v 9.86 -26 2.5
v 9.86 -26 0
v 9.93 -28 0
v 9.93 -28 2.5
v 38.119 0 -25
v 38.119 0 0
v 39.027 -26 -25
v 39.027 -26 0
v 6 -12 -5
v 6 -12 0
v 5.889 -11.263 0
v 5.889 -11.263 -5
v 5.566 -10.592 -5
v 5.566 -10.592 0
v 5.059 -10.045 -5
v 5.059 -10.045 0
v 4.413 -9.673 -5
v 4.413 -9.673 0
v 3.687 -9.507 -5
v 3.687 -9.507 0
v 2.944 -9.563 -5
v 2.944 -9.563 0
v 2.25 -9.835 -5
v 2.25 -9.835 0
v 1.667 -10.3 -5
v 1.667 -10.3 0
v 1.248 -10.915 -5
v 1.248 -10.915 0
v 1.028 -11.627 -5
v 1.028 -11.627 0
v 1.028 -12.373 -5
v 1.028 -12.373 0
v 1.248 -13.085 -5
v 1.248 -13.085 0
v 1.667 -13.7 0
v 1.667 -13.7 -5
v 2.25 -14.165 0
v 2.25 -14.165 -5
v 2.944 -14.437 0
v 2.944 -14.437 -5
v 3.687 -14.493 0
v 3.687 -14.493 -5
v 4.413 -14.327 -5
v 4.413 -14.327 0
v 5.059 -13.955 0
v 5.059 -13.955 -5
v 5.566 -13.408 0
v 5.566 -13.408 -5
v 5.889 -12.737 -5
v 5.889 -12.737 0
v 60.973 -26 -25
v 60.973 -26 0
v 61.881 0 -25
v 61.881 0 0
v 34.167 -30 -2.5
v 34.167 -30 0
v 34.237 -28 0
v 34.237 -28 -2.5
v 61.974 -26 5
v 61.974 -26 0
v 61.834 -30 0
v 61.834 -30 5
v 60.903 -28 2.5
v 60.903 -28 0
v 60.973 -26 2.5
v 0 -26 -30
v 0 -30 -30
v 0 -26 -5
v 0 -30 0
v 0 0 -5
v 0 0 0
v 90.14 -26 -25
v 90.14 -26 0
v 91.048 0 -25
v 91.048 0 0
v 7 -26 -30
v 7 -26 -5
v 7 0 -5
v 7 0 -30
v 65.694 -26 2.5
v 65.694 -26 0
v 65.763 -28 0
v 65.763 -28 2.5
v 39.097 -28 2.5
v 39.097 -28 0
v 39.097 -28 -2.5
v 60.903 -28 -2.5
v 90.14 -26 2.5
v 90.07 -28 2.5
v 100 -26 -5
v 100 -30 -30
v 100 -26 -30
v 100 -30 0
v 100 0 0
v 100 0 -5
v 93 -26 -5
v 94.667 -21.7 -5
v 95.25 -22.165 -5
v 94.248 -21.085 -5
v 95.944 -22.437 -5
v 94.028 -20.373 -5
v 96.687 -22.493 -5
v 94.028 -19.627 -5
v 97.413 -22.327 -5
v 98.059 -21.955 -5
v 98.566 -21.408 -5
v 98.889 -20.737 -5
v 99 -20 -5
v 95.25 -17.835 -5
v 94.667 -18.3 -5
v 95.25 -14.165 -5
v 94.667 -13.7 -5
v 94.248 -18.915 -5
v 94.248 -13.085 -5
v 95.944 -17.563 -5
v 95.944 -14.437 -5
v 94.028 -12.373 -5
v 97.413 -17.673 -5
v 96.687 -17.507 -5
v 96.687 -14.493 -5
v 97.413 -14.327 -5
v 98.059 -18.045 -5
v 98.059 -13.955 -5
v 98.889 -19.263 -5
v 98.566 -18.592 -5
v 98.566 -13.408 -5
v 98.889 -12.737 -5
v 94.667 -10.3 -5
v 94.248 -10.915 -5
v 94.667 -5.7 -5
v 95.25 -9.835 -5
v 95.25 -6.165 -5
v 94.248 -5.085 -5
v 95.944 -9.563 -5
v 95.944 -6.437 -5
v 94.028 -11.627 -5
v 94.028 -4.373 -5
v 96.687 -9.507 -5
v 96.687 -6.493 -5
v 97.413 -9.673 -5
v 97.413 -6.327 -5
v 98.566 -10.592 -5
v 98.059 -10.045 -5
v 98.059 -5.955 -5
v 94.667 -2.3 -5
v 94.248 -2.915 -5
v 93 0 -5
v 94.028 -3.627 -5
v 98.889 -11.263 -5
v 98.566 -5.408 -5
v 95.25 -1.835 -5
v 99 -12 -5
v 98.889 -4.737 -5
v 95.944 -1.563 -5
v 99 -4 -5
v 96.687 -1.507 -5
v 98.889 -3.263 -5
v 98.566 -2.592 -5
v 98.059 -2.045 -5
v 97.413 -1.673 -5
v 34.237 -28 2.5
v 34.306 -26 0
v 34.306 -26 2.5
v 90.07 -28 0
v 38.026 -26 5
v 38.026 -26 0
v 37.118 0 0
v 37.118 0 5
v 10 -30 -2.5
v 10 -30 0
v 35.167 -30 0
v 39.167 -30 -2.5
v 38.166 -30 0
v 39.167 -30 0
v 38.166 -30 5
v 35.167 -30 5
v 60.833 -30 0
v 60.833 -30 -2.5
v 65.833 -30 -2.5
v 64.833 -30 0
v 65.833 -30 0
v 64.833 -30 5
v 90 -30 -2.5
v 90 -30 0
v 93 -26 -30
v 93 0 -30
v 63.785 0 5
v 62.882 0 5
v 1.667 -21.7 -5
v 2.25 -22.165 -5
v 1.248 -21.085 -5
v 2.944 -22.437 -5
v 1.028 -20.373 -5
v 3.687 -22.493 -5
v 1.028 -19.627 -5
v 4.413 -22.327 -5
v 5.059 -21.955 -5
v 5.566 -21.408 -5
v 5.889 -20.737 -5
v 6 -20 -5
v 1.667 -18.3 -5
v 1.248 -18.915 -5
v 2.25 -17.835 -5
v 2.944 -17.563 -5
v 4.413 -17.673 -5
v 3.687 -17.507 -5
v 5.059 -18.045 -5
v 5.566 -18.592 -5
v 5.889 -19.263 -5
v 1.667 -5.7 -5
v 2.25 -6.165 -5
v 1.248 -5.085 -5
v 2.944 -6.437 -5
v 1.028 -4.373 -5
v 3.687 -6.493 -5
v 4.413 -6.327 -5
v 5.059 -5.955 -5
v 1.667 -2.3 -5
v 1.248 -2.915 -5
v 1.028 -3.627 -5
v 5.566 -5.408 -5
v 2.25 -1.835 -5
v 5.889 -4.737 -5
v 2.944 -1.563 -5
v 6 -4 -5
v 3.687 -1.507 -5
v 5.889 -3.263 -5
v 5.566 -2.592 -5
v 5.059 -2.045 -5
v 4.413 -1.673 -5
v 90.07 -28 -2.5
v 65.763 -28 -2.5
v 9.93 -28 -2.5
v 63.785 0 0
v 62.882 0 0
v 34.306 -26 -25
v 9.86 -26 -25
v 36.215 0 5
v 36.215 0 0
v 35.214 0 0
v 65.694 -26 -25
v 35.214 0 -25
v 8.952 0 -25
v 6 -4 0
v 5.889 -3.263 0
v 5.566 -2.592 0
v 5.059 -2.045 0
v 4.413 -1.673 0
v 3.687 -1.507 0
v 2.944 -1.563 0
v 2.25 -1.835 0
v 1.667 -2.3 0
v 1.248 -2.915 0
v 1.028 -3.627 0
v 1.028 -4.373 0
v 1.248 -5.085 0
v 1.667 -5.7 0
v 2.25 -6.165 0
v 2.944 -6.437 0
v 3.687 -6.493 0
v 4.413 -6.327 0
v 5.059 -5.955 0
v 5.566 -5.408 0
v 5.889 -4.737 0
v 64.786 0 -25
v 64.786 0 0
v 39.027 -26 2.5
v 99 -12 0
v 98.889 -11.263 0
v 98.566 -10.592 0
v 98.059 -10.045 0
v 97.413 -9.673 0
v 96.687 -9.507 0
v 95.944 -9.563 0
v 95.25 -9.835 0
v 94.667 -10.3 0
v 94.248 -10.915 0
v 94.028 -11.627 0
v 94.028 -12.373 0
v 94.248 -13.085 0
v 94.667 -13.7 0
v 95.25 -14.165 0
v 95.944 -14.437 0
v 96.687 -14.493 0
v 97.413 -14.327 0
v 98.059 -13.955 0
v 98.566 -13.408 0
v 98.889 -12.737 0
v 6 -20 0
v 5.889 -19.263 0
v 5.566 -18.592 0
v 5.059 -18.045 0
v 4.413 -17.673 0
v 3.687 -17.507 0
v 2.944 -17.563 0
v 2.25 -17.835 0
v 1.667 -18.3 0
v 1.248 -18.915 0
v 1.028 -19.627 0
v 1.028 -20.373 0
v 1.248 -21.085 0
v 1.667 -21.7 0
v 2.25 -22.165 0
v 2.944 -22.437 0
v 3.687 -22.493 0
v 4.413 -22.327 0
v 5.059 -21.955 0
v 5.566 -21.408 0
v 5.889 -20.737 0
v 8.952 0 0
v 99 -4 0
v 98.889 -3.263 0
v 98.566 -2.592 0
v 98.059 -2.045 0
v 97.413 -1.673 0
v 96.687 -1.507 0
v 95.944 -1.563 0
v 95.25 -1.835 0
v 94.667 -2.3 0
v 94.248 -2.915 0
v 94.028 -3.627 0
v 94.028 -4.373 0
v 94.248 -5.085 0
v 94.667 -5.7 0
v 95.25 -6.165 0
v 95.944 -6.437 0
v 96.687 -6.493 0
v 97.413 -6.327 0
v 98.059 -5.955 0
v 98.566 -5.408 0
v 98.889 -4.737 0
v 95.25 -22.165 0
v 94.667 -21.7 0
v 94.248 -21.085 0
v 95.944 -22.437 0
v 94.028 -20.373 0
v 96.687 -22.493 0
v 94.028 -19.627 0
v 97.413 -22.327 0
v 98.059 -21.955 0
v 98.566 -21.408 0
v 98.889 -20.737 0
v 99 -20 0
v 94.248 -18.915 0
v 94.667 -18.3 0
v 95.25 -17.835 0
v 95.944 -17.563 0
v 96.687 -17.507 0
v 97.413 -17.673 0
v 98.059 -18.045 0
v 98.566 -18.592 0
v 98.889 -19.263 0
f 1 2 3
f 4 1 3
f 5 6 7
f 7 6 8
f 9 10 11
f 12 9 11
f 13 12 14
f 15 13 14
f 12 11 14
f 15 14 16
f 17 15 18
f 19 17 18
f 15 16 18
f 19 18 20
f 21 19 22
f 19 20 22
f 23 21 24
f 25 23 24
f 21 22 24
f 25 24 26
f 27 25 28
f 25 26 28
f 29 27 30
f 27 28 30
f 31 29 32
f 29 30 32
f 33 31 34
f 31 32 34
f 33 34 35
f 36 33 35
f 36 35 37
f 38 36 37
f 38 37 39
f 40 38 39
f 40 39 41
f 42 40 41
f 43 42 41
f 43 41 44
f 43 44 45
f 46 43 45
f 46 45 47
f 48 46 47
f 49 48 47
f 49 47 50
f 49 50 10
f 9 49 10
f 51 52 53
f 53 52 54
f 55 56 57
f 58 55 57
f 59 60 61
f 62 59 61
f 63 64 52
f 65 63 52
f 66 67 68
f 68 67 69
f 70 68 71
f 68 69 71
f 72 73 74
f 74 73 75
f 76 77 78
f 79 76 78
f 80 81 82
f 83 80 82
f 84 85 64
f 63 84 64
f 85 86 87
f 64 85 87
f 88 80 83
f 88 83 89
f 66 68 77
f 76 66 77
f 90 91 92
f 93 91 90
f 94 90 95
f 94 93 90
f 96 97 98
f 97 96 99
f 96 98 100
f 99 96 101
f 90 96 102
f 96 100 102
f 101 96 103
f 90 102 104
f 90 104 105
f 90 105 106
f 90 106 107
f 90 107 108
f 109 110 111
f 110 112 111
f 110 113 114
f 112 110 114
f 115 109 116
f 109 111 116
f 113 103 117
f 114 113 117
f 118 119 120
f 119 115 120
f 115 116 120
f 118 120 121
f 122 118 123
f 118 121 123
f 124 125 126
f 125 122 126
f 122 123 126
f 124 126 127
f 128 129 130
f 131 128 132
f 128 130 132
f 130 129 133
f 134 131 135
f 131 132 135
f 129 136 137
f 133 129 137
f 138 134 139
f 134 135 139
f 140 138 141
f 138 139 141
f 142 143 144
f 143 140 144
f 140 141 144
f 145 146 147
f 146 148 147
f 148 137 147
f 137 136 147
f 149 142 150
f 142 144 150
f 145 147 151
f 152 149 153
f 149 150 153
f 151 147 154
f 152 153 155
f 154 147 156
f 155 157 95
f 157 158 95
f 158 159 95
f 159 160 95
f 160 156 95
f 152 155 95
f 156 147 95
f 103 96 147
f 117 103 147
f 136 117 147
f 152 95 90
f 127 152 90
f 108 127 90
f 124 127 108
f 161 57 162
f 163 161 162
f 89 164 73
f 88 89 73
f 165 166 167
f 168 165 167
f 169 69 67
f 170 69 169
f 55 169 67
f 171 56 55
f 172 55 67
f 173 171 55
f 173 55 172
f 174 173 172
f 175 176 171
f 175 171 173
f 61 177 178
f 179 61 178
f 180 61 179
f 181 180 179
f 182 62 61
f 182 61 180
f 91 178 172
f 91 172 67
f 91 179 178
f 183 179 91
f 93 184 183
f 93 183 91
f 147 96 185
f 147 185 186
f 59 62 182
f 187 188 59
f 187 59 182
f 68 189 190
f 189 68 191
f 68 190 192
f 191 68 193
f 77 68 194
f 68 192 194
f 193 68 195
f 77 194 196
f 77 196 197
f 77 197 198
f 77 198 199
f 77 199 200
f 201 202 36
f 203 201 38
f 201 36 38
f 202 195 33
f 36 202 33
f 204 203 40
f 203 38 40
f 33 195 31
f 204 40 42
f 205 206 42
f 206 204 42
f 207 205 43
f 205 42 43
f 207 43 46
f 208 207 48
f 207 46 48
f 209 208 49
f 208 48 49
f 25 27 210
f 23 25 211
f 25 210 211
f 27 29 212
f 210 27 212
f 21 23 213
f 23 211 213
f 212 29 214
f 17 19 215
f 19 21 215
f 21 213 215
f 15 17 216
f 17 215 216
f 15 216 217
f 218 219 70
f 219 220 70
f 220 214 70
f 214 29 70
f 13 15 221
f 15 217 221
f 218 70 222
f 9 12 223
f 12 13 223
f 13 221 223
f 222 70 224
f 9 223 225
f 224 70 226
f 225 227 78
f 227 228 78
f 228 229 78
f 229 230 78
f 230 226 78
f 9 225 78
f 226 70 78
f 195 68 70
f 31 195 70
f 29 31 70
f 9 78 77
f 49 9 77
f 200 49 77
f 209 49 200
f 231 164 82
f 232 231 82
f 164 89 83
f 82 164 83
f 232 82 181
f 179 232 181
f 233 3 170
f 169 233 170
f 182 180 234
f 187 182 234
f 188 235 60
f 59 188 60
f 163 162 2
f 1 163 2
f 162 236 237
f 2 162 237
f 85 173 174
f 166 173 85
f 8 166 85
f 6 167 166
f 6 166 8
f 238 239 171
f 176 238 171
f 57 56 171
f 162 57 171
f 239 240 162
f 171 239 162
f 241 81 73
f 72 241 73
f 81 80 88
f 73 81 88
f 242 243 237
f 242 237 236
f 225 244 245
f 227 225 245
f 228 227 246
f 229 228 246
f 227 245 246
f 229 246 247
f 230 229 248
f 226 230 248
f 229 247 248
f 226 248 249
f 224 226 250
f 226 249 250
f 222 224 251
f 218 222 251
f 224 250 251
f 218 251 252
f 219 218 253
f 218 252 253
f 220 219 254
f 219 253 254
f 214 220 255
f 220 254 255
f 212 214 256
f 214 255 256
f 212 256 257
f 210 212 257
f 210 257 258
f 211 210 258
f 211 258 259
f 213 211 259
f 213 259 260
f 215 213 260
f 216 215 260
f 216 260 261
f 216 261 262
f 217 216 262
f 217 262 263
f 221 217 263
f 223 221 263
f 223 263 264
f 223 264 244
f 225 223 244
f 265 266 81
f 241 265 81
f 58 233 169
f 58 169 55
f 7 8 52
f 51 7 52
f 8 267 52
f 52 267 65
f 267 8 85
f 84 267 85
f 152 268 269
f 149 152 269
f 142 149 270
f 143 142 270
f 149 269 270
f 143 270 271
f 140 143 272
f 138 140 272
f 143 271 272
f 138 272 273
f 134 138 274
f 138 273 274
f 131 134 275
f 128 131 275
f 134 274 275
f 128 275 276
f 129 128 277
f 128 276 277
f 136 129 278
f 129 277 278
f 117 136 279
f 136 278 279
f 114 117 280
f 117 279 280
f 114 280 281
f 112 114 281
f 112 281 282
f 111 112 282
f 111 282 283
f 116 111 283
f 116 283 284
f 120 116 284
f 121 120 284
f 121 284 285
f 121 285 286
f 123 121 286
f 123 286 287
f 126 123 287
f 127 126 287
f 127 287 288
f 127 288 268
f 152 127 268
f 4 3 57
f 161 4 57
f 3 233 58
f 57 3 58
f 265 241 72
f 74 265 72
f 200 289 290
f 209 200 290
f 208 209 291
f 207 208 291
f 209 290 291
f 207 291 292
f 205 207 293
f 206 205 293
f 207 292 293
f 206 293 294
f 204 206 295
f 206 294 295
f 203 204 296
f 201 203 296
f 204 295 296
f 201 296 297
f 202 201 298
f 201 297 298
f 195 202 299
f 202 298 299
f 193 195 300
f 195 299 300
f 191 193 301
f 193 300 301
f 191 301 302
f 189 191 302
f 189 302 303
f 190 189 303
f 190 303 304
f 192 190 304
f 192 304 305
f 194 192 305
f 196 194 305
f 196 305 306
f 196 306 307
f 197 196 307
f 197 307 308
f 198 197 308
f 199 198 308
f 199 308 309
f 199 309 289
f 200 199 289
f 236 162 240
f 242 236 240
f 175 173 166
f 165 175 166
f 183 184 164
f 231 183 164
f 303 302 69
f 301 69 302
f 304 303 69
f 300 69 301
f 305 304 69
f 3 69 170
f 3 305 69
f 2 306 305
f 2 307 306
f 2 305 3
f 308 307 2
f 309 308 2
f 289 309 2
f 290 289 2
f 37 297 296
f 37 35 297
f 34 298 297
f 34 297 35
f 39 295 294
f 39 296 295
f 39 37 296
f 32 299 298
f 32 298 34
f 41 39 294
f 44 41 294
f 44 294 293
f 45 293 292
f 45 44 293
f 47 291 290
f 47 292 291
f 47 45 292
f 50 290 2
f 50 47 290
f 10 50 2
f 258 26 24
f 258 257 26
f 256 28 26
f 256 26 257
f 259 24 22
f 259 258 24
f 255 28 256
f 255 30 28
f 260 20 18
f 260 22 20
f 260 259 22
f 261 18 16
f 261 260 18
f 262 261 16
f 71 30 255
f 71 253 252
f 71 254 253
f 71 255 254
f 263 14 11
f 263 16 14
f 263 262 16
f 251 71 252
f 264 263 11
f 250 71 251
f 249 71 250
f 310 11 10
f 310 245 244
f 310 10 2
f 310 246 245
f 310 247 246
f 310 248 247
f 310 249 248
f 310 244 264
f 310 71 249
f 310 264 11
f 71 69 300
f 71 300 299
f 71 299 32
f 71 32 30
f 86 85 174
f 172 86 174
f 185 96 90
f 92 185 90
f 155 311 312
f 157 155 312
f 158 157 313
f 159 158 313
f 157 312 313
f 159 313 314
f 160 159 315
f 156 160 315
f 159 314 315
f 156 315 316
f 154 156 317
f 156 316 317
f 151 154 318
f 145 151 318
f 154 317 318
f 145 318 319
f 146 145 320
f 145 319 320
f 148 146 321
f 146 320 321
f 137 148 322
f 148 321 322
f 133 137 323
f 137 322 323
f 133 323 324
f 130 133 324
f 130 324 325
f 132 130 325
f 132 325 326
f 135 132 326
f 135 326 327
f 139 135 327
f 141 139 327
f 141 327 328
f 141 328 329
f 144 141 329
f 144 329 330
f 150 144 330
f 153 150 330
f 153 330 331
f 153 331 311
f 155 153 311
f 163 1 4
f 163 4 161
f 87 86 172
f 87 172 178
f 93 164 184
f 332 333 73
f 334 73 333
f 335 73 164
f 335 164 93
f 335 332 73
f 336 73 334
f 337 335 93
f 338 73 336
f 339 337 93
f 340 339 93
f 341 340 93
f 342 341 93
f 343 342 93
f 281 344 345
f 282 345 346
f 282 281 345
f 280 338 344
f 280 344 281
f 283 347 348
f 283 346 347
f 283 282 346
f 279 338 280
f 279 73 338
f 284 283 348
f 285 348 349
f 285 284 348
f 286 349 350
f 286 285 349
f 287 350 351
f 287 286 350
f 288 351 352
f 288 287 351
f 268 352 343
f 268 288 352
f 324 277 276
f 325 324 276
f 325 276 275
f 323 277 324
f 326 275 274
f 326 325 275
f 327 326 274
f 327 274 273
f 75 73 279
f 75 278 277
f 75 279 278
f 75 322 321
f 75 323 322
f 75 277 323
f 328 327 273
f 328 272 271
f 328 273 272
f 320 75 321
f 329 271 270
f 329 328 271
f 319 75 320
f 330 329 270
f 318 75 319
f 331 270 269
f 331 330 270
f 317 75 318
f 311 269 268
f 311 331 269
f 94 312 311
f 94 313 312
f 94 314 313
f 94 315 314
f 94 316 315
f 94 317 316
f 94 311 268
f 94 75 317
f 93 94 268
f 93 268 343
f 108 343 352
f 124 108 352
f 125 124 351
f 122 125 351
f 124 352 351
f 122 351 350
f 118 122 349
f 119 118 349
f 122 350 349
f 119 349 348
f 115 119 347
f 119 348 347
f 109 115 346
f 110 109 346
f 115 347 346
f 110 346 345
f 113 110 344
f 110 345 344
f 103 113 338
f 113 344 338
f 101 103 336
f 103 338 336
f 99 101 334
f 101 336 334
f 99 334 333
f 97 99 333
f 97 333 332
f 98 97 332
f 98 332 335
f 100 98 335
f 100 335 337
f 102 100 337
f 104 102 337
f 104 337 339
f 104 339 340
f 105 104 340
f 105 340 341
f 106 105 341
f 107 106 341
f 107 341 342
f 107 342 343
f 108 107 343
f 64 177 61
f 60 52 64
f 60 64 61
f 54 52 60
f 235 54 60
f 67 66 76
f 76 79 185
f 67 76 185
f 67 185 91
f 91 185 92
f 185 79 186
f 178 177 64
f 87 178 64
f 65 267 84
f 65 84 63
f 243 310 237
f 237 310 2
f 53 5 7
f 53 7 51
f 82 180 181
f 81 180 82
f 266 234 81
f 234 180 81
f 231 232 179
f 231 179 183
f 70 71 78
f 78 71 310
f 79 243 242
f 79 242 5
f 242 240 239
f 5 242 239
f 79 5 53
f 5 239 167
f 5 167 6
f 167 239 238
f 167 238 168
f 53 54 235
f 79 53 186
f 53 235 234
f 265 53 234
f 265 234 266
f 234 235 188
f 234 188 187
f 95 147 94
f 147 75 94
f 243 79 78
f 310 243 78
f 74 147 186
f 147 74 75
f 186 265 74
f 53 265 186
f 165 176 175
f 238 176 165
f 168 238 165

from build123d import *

# Parameters (mm, degrees)
SKETCH3_W           = 100
SKETCH3_H           = 30
BOSS_EXTRUDE1_DEPTH = 30
SKETCH3_6_R         = 2.5
CUT_EXTRUDE1_DEPTH  = 25
CUT_EXTRUDE3_START  = -5
SKETCH3_9_W         = 7
SKETCH3_9_H         = 26
CUT_EXTRUDE3_DEPTH  = 104.627804912
CUT_EXTRUDE4_DEPTH  = 2.5
BOSS_EXTRUDE2_DEPTH = 2.5
BOSS_EXTRUDE3_DEPTH = 5


with BuildPart() as part:
    # Sketch3 → Boss-Extrude1 (new body)
    with BuildSketch(Plane.XY):
        with Locations((50, -15)):
            Rectangle(SKETCH3_W, SKETCH3_H)
    extrude(amount=-BOSS_EXTRUDE1_DEPTH)

    # Sketch3<6> → Cut-Extrude1 (cut)
    with BuildSketch(Plane.XY):
        Polygon((35.214289751, 0), (8.952376915, 0), (9.860316922, -26), (34.306349745, -26), align=None)
        Polygon((61.880956418, 0), (38.119043582, 0), (39.026983589, -26), (60.973016411, -26), align=None)
        Polygon((91.047623085, 0), (64.785710249, 0), (65.693650255, -26), (90.139683078, -26), align=None)
        with Locations((3.5, -4)):
            Circle(SKETCH3_6_R)
        with Locations((3.5, -12)):
            Circle(SKETCH3_6_R)
        with Locations((3.5, -20)):
            Circle(SKETCH3_6_R)
        with Locations((96.5, -4)):
            Circle(SKETCH3_6_R)
        with Locations((96.5, -12)):
            Circle(SKETCH3_6_R)
        with Locations((96.5, -20)):
            Circle(SKETCH3_6_R)
    extrude(amount=-CUT_EXTRUDE1_DEPTH, mode=Mode.SUBTRACT)

    # Sketch3<9> → Cut-Extrude3 (cut, through all)
    with BuildSketch(Plane.XY.offset(CUT_EXTRUDE3_START)):
        with Locations((3.5, -13)):
            Rectangle(SKETCH3_9_W, SKETCH3_9_H)
        with Locations((96.5, -13)):
            Rectangle(SKETCH3_9_W, SKETCH3_9_H)
    extrude(amount=-CUT_EXTRUDE3_DEPTH, mode=Mode.SUBTRACT)

    # Sketch3<10> → Cut-Extrude4 (cut)
    with BuildSketch(Plane.XY):
        Polygon((34.236508206, -28), (9.930158461, -28), (10, -30), (34.166666667, -30), align=None)
        Polygon((60.903174872, -28), (39.096825128, -28), (39.166666667, -30), (60.833333333, -30), align=None)
        Polygon((90.069841539, -28), (65.763491794, -28), (65.833333333, -30), (90, -30), align=None)
    extrude(amount=-CUT_EXTRUDE4_DEPTH, mode=Mode.SUBTRACT)

    # Sketch3<11> → Boss-Extrude2 (add)
    with BuildSketch(Plane.XY):
        Polygon((34.306349745, -26), (9.860316922, -26), (9.930158461, -28), (34.236508206, -28), align=None)
        Polygon((60.973016411, -26), (39.026983589, -26), (39.096825128, -28), (60.903174872, -28), align=None)
        Polygon((90.139683078, -26), (65.693650255, -26), (65.763491794, -28), (90.069841539, -28), align=None)
    extrude(amount=BOSS_EXTRUDE2_DEPTH)

    # Sketch3<12> → Boss-Extrude3 (add)
    with BuildSketch(Plane.XY):
        Polygon((37.118434038, 0), (36.214899296, 0), (35.167276211, -30), (38.166057122, -30), align=None)
        Polygon((63.785100704, 0), (62.881565962, 0), (61.833942878, -30), (64.832723789, -30), align=None)
    extrude(amount=BOSS_EXTRUDE3_DEPTH)


solid = part.part
